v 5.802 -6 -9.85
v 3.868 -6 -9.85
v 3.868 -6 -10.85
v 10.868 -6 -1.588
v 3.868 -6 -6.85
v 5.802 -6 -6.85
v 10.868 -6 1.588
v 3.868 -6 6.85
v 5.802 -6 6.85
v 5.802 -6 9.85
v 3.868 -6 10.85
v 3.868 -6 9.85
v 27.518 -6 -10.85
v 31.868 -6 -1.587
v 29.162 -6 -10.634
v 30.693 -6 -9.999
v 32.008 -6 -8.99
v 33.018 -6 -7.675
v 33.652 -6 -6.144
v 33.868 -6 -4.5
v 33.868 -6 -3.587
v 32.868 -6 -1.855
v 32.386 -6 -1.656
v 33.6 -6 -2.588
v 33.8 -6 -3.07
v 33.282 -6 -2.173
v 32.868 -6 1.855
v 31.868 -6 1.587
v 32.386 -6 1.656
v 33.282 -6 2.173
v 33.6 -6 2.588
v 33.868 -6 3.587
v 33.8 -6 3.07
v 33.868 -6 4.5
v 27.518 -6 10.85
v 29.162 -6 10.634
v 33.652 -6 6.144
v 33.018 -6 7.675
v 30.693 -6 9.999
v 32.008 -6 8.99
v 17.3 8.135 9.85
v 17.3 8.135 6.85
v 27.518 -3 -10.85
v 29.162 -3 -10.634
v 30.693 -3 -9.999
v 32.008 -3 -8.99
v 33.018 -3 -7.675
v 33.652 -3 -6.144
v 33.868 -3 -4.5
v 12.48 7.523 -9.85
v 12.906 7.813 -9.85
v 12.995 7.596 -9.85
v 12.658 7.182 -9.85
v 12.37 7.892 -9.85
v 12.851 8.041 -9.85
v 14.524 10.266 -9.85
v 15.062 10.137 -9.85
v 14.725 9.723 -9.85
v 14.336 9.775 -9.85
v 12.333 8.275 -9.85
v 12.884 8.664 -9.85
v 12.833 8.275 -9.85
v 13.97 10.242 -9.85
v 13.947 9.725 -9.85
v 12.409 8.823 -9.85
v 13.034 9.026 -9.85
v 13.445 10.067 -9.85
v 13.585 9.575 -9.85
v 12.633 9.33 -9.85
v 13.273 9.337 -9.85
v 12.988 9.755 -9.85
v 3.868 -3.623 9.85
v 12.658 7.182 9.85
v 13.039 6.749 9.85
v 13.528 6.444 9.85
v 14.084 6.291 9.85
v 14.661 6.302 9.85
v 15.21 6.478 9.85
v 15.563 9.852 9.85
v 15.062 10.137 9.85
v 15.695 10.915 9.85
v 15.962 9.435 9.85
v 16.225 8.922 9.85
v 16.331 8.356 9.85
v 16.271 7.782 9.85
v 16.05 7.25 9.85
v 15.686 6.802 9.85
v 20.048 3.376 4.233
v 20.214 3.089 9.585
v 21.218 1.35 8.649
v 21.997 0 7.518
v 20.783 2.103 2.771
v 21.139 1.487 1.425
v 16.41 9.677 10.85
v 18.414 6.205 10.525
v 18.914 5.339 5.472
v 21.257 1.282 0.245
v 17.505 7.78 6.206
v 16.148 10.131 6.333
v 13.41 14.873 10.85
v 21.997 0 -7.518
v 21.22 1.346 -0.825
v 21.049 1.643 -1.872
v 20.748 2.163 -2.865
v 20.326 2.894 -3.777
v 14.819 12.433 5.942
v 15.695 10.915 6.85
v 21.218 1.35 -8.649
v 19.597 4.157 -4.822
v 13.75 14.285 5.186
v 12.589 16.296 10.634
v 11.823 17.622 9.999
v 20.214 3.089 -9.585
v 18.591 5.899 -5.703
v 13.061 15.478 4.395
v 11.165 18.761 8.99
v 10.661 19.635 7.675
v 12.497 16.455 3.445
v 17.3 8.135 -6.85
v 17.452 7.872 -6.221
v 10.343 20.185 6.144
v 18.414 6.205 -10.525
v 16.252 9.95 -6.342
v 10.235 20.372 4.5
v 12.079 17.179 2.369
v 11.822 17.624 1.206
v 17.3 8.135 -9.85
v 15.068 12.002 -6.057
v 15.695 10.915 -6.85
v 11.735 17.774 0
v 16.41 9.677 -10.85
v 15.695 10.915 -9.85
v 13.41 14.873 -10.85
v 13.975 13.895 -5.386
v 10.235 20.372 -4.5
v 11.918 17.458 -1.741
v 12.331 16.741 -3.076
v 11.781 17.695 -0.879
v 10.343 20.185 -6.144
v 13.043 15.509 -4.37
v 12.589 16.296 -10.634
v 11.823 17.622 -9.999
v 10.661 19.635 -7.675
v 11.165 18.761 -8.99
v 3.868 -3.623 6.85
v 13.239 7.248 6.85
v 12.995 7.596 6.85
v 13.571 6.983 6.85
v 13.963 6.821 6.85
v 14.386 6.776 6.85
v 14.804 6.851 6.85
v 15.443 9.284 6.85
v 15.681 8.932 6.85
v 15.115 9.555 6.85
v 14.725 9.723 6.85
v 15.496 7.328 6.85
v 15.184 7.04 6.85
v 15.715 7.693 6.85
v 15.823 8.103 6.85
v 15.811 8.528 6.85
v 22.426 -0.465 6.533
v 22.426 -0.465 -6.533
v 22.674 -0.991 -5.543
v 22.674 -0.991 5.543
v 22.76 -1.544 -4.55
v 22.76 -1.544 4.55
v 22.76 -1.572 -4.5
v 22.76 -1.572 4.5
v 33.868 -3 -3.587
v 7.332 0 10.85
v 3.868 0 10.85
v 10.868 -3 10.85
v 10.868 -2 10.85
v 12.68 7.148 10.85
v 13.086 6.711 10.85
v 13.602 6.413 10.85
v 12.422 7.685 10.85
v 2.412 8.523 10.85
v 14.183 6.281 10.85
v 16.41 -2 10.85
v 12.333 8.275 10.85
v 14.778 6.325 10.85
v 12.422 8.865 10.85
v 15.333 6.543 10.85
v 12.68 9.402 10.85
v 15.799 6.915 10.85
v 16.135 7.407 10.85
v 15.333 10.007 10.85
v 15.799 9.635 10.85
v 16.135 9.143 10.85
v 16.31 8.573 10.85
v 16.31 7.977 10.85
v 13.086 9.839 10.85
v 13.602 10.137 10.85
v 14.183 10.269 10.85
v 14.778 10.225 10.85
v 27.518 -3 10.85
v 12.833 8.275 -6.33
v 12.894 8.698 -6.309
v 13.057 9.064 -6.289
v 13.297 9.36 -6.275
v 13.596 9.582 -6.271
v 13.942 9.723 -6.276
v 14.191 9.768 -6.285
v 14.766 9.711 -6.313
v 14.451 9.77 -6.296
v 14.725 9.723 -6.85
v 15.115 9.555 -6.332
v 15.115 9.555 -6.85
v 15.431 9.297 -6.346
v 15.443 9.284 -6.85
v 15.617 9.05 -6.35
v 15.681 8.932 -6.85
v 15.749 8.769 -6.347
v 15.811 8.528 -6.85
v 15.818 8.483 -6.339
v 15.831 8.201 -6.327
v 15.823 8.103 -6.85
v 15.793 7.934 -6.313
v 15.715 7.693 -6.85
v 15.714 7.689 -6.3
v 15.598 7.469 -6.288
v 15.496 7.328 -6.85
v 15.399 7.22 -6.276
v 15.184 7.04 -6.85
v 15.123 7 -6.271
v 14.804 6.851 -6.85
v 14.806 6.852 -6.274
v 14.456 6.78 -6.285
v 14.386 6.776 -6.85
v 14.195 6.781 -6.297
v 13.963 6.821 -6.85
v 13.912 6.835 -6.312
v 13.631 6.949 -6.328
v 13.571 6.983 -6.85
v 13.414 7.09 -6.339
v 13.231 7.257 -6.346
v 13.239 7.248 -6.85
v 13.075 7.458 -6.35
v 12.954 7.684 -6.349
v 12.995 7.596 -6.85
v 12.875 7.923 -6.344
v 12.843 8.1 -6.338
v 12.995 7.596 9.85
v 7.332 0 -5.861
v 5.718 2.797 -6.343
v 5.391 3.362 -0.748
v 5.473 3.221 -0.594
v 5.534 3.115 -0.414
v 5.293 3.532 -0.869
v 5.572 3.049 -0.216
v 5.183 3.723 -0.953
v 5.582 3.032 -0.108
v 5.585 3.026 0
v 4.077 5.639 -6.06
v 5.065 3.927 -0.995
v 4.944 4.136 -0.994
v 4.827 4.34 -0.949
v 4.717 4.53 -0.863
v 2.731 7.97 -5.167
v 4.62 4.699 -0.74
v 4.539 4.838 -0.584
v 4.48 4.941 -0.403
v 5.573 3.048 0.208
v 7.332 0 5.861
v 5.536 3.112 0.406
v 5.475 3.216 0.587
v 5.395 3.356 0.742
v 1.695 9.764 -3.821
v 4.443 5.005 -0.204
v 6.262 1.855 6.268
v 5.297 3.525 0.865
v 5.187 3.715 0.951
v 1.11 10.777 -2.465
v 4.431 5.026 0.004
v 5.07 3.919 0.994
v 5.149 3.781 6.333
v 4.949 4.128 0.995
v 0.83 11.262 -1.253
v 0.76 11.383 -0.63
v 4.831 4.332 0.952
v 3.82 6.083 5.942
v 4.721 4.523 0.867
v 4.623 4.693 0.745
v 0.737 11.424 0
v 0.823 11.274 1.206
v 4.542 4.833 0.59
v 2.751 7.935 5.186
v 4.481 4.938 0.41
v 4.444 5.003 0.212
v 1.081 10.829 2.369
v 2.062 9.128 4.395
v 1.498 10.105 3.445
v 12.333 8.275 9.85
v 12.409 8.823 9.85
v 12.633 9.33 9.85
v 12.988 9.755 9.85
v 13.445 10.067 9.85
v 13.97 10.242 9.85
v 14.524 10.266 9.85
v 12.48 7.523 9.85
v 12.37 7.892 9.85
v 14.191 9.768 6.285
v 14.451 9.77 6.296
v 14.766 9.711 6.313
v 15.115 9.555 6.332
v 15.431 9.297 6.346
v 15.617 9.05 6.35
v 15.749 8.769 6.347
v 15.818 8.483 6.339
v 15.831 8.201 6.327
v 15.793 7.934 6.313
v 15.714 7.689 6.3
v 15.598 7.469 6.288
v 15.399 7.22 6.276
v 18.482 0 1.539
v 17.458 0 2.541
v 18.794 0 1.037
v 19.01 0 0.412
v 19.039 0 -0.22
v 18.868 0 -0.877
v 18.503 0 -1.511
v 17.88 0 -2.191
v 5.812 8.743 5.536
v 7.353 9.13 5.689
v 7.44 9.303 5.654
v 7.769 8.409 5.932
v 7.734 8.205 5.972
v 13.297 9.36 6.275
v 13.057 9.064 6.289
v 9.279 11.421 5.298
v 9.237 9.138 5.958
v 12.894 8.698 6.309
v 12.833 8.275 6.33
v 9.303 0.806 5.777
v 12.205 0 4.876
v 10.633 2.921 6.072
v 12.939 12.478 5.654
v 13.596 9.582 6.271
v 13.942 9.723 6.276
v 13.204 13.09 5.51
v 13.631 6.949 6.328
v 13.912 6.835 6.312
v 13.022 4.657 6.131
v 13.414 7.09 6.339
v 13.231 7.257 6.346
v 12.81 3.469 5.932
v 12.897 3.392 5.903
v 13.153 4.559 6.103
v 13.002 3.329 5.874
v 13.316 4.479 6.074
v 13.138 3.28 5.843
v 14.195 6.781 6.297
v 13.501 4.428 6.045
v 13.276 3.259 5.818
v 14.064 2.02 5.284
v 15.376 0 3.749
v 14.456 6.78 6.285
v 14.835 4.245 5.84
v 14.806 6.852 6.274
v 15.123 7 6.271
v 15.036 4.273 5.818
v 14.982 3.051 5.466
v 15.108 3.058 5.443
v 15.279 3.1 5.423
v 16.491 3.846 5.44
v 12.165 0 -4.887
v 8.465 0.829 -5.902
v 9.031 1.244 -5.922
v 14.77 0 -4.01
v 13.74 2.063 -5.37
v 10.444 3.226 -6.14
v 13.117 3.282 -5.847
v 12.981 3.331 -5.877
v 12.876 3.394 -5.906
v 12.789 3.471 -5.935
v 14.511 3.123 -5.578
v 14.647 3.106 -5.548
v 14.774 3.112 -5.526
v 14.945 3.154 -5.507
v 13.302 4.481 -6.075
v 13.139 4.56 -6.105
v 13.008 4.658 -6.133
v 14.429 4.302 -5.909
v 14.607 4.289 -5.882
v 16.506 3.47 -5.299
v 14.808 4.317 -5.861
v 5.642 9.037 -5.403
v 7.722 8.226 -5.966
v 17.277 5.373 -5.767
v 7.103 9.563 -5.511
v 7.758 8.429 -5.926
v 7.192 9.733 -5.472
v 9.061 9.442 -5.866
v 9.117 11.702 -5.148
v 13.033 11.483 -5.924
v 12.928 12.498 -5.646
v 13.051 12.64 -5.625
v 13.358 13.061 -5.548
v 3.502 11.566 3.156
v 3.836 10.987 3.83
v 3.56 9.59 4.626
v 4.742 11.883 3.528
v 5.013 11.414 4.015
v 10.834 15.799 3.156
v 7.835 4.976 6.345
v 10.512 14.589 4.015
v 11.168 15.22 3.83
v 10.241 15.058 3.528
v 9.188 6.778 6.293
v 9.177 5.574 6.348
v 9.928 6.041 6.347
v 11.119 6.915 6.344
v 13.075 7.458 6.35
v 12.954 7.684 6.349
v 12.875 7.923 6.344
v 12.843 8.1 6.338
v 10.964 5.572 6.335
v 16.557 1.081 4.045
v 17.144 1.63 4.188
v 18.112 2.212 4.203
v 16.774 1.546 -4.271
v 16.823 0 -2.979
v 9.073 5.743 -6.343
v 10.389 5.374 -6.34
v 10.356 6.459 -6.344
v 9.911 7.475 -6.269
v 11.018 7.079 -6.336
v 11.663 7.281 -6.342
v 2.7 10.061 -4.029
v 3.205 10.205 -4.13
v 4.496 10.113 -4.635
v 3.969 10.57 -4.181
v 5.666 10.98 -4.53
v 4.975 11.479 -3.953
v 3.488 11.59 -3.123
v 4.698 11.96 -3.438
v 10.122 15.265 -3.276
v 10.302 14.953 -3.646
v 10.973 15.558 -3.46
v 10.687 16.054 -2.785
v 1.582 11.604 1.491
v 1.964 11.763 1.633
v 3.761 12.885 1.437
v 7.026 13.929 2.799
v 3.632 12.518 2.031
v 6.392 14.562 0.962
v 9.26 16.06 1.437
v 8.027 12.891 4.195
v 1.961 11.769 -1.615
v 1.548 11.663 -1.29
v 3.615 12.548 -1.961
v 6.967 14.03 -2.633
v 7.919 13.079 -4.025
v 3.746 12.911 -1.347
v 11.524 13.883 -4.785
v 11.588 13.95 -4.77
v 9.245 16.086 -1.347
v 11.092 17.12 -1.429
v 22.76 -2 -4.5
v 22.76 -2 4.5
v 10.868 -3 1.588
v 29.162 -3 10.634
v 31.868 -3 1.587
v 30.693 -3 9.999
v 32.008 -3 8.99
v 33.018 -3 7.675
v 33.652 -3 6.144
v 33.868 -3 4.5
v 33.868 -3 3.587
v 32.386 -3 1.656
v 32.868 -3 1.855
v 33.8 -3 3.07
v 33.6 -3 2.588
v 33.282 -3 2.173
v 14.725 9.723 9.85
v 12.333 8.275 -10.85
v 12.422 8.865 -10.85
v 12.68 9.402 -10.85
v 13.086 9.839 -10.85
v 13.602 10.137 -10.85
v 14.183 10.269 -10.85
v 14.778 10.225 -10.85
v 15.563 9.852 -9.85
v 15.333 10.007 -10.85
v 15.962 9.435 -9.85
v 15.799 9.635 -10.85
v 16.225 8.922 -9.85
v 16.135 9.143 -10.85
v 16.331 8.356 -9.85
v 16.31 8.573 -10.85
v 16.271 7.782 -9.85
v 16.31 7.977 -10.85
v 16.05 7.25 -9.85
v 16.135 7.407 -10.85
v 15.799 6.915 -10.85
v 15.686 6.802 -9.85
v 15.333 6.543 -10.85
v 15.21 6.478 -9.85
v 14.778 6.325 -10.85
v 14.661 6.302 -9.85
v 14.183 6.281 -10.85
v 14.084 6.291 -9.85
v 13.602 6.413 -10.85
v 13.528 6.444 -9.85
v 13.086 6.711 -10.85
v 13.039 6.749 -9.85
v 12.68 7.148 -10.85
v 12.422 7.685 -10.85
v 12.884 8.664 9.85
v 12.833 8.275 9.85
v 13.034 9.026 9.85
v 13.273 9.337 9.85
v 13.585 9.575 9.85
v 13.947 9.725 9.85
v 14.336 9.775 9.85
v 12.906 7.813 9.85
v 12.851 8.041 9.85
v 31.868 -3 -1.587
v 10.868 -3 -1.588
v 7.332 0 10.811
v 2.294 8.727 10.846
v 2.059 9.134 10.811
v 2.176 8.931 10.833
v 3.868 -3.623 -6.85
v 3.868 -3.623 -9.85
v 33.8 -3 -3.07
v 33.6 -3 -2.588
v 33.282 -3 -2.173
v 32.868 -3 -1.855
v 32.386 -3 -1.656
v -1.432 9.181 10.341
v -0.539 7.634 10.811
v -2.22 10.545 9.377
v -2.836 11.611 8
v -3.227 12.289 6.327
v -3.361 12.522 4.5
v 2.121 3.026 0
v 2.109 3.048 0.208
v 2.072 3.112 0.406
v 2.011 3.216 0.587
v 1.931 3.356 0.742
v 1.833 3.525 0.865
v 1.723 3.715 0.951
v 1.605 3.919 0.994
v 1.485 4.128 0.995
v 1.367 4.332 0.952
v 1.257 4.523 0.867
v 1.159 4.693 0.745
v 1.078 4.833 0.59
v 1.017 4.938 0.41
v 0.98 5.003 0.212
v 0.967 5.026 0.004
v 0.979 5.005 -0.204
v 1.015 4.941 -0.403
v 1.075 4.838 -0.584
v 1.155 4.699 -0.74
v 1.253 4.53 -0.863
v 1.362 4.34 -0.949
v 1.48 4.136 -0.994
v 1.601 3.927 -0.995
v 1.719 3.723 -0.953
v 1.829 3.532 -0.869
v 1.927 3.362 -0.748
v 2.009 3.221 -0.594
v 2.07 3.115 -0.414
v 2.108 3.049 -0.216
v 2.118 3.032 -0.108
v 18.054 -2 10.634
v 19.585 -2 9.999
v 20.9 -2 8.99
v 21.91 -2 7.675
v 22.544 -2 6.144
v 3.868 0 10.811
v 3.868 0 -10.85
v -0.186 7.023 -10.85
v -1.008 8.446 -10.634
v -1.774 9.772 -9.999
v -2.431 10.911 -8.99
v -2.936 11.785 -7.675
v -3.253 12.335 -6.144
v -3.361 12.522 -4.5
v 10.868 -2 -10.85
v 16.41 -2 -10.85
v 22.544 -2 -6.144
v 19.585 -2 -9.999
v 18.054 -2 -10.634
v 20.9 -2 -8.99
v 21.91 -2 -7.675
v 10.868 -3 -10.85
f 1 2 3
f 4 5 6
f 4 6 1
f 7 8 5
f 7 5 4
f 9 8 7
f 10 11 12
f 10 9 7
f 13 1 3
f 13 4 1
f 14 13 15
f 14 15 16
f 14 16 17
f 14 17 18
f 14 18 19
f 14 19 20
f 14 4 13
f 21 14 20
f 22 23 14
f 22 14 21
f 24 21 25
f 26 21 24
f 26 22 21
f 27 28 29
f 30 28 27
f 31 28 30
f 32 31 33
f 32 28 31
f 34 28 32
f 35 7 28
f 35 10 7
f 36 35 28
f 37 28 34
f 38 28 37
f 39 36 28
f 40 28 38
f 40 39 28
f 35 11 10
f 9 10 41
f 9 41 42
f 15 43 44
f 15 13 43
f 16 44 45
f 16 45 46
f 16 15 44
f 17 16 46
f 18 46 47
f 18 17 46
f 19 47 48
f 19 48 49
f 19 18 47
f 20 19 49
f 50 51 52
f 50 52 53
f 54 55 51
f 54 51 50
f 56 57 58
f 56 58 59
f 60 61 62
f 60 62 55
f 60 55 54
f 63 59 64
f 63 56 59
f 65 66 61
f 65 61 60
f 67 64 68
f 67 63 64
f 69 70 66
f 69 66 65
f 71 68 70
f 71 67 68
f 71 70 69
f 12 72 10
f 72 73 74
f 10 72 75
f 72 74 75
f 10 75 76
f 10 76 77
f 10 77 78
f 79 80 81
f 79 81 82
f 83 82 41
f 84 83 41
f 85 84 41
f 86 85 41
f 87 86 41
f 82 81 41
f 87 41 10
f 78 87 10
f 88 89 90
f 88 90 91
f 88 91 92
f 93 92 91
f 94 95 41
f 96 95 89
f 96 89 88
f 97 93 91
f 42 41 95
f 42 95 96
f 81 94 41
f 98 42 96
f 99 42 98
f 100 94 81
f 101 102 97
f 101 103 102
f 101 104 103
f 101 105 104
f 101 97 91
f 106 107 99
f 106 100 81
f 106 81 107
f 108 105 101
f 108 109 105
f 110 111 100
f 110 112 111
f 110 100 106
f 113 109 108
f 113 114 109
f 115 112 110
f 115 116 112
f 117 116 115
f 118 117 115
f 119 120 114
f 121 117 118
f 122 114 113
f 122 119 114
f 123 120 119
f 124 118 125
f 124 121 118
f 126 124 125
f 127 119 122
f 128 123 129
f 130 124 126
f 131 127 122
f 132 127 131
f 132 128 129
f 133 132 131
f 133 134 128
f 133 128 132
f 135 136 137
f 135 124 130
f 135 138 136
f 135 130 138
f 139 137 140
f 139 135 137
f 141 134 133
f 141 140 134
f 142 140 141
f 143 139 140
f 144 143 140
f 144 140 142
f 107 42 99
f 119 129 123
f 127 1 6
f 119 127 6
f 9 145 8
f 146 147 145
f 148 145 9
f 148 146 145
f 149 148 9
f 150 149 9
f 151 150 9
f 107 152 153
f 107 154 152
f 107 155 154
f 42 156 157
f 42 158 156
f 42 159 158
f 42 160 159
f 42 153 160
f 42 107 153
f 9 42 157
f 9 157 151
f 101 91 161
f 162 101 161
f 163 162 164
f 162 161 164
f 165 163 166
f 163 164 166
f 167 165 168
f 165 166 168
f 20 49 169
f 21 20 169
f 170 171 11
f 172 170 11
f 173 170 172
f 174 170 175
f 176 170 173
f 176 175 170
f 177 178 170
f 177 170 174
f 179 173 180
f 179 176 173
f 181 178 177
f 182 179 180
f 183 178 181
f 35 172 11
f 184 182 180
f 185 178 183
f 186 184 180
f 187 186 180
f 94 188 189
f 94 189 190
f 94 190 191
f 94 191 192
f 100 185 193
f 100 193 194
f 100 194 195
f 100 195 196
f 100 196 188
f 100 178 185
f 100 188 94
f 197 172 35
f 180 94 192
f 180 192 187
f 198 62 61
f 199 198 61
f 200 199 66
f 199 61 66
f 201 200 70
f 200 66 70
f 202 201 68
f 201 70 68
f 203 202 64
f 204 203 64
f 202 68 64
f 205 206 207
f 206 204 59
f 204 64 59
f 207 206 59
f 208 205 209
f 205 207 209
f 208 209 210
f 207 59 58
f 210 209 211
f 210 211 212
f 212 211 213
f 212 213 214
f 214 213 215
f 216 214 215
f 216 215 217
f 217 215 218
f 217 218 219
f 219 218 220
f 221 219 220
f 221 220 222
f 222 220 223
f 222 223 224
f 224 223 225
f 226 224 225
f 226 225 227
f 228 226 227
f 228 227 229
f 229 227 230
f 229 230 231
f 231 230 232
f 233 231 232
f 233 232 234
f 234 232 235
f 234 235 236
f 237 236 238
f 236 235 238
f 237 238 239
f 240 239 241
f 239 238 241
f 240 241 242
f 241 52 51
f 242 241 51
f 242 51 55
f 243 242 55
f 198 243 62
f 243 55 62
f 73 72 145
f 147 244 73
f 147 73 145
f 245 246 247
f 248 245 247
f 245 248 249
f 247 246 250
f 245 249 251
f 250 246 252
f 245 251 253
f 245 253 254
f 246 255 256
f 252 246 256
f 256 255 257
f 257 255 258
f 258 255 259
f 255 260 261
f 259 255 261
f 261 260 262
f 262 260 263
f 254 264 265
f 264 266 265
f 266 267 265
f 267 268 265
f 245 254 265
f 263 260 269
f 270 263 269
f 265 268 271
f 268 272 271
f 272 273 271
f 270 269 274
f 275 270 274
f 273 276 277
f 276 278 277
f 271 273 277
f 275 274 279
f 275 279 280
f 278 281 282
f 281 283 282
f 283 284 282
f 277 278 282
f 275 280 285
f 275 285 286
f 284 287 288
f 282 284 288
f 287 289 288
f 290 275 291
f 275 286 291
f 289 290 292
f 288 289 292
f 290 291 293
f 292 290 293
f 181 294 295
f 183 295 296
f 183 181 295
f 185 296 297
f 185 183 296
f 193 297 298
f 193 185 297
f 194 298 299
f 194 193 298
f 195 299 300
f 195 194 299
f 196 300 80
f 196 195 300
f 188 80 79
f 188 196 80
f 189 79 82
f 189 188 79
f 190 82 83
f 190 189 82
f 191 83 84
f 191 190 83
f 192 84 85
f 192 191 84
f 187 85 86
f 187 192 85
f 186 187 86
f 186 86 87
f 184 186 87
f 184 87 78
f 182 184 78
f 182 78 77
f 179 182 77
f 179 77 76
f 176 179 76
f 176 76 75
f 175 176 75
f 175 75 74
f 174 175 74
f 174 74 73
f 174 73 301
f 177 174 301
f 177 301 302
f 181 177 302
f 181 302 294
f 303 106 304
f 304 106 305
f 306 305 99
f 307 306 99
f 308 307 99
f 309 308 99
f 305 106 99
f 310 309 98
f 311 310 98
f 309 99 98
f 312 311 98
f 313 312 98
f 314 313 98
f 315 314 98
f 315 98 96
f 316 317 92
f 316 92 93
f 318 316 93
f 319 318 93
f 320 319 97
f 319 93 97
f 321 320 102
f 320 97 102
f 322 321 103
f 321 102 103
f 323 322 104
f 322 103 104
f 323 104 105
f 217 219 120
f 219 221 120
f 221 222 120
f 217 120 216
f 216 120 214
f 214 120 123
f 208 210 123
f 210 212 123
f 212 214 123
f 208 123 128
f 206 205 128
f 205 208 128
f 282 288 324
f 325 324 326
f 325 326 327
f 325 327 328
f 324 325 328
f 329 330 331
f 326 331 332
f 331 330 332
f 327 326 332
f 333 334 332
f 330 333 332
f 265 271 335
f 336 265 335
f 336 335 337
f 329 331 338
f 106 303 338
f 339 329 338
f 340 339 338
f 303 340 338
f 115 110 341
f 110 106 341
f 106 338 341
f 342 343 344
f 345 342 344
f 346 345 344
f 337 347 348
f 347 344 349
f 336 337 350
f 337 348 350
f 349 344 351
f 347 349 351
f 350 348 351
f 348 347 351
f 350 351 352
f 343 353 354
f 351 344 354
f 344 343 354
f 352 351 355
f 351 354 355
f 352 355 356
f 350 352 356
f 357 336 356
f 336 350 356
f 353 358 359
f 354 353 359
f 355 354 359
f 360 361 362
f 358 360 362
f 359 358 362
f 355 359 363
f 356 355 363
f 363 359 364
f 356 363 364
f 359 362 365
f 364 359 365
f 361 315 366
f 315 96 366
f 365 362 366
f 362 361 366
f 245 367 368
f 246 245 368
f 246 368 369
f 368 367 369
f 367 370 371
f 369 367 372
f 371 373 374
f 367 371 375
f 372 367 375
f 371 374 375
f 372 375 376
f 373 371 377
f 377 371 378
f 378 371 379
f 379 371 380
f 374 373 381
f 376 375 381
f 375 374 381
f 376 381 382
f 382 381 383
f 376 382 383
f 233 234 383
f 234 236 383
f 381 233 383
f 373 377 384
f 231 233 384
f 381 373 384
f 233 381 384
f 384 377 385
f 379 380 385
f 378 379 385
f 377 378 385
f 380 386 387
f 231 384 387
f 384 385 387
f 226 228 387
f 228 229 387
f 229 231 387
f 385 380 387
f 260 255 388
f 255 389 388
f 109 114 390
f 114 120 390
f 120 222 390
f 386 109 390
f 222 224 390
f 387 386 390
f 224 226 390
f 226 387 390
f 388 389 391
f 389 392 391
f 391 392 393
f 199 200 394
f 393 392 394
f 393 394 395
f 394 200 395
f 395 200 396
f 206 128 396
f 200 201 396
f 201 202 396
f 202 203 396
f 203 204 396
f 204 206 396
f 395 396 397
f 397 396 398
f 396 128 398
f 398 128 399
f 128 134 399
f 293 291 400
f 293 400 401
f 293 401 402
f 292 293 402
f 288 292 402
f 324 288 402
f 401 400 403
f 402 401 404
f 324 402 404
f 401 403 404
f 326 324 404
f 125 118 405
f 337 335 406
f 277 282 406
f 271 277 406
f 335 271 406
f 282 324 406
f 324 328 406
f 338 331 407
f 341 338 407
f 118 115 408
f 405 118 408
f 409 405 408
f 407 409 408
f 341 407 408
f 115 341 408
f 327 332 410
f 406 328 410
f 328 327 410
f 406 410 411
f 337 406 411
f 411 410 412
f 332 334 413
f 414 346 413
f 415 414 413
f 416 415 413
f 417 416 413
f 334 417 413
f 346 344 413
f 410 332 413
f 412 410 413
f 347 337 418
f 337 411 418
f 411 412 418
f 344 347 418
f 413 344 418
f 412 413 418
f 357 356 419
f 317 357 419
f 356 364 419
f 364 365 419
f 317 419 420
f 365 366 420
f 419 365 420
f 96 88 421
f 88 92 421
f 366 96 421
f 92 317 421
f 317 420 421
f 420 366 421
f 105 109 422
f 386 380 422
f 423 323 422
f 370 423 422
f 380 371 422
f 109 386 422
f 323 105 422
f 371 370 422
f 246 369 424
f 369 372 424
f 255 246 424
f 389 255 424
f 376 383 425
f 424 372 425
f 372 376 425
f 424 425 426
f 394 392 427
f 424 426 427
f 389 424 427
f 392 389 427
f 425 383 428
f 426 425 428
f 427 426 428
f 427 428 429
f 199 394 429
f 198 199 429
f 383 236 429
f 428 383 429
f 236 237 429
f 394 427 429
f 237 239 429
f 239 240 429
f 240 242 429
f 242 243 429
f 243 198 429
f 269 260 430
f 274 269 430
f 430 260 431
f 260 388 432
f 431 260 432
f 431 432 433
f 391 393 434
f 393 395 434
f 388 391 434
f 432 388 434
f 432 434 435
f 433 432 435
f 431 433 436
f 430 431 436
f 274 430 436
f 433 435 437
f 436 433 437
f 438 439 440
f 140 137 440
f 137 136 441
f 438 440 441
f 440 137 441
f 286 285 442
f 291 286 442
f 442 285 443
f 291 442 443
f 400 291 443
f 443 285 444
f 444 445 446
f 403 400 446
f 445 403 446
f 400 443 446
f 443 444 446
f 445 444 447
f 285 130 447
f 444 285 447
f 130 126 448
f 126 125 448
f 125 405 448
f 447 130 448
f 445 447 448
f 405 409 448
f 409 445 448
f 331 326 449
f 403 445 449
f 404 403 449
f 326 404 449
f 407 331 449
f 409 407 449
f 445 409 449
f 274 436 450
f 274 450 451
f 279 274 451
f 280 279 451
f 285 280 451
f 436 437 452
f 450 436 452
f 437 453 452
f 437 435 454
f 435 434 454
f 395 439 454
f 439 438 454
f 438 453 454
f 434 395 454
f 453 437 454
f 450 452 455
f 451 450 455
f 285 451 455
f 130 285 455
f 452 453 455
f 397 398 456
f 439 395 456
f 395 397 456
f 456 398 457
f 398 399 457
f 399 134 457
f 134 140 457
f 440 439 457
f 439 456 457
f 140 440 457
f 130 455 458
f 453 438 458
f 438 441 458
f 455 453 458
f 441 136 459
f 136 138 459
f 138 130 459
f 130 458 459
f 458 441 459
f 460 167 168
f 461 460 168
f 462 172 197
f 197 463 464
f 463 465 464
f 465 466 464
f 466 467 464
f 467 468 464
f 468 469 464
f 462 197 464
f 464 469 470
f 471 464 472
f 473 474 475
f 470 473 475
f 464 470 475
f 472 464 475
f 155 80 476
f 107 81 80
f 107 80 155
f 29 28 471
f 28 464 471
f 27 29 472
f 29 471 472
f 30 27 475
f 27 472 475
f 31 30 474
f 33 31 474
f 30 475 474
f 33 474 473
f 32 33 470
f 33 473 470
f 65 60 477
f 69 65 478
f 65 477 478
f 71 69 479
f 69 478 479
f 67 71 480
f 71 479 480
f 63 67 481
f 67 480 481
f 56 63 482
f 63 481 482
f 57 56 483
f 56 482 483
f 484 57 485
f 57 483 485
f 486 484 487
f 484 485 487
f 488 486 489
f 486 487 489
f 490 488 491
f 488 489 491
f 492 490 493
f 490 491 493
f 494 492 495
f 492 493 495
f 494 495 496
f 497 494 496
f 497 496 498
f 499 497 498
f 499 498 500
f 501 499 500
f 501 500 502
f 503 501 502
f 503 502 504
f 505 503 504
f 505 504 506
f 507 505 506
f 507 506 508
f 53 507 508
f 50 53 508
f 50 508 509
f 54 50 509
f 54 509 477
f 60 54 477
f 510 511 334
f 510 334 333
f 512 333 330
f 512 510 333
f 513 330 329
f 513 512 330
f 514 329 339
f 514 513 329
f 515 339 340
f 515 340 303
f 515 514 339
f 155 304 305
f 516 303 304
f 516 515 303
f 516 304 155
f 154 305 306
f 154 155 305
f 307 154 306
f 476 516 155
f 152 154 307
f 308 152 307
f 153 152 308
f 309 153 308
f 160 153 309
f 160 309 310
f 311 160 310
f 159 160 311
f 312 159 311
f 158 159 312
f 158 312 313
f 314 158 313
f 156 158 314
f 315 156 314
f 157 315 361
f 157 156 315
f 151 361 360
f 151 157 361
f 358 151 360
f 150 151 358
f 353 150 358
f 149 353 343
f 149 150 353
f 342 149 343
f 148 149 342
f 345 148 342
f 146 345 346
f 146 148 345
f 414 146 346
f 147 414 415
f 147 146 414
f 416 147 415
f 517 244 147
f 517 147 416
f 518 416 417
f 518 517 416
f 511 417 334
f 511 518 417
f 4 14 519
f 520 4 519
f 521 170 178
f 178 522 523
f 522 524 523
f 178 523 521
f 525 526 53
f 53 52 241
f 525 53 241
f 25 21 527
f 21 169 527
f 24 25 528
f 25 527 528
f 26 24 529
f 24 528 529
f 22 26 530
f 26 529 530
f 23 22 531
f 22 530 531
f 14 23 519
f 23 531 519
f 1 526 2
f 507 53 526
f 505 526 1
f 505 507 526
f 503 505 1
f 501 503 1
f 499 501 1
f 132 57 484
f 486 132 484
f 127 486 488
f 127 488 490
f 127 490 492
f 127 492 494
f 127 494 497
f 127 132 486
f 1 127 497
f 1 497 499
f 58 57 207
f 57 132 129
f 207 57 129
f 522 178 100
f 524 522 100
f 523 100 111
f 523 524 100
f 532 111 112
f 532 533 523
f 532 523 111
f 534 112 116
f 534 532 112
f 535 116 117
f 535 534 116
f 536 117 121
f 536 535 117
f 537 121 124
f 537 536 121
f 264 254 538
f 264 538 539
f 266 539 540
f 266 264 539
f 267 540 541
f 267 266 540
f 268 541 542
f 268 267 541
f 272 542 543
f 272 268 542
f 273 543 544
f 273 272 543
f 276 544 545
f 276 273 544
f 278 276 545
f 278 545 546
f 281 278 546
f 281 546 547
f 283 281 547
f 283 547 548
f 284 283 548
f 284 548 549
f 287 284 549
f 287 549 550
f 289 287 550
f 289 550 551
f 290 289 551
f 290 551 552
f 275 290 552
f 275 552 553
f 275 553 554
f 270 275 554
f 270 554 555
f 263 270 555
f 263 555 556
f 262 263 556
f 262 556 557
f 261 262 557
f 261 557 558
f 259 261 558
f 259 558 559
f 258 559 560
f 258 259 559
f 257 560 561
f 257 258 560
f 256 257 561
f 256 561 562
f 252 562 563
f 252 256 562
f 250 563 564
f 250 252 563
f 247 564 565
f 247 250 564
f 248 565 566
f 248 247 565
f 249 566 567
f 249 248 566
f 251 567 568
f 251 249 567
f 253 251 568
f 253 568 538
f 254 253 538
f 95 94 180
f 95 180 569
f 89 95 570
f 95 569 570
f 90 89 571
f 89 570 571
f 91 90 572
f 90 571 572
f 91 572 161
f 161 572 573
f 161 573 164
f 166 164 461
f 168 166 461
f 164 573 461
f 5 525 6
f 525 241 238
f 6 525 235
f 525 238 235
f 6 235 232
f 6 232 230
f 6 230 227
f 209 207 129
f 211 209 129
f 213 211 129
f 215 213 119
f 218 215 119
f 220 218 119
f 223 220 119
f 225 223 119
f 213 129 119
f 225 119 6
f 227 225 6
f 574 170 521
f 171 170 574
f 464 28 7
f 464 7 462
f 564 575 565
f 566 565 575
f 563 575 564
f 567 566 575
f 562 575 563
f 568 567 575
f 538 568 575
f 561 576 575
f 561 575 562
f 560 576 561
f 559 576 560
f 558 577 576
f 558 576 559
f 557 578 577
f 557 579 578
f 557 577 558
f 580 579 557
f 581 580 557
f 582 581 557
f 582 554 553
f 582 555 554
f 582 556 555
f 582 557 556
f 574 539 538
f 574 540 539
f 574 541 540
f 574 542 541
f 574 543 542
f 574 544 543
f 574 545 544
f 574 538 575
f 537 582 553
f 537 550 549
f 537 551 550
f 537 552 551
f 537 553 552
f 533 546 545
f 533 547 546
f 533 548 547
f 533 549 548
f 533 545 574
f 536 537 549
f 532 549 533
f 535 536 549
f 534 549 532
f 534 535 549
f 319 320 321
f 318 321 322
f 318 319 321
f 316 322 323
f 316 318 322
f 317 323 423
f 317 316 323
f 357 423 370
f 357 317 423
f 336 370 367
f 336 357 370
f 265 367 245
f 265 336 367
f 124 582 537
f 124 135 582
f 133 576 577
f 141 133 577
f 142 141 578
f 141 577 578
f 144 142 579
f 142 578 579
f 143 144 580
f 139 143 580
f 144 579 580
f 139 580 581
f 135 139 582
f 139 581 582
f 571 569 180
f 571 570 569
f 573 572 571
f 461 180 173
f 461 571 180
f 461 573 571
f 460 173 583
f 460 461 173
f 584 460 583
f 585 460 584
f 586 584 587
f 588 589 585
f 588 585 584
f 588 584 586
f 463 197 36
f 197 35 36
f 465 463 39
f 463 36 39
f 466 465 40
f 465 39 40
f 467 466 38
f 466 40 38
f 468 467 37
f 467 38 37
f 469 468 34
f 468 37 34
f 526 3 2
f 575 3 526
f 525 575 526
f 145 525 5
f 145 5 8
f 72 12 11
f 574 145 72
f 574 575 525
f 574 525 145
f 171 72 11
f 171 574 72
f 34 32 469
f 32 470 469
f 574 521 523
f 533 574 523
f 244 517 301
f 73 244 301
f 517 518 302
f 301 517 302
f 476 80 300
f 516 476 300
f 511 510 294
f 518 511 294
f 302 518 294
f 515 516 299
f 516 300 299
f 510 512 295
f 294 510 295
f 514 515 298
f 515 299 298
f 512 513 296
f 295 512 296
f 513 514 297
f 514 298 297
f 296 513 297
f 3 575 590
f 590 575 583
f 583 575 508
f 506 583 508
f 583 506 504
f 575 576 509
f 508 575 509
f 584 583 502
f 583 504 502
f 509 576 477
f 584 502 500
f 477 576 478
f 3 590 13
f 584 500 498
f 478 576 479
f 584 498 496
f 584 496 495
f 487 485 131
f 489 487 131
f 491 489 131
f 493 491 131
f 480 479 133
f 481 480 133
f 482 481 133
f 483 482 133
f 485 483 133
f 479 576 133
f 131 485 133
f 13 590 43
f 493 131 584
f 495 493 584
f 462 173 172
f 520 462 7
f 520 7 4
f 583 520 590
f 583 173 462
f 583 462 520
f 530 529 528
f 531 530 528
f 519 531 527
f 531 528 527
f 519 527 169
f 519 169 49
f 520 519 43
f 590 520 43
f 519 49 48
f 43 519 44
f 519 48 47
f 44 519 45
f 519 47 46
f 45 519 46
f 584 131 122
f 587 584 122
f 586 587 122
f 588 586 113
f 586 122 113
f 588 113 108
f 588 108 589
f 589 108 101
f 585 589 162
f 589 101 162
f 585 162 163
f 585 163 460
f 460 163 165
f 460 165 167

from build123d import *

# Parameters (mm, degrees)
SKETCH2_W           = 21.7
SKETCH2_H           = 25.05
SKETCH2_RX          = 9.525
SKETCH2_RY          = 6.35
BOSS_EXTRUDE1_DEPTH = 12.7
SKETCH3_W           = 21.660653916
SKETCH3_H           = 25.05
BOSS_EXTRUDE2_DEPTH = 3
SKETCH5_W           = 18.892037138
SKETCH5_H           = 21.7
BOSS_EXTRUDE3_DEPTH = 2
SKETCH6_W           = 30
SKETCH6_H           = 21.7
BOSS_EXTRUDE4_DEPTH = 4
SKETCH7_W           = 21.7
SKETCH7_H           = 1
SKETCH7_W_2         = 3.175
SKETCH7_H_2         = 3
CUT_EXTRUDE2_DEPTH  = 23
SKETCH7_3_W         = 21.7
SKETCH7_3_H         = 7.272473706
CUT_EXTRUDE3_DEPTH  = 44.803879418
SKETCH11_R          = 1
CUT_EXTRUDE8_DEPTH  = 33.487034031
SKETCH15_W          = 3
SKETCH15_H          = 3
CUT_EXTRUDE9_DEPTH  = 28.443249292
CUT_EXTRUDE4_REACH  = 47.088
SKETCH9_R           = 1.5
SKETCH10_R          = 2
CUT_EXTRUDE7_DEPTH  = 1
FILLET5_R           = 6.35
FILLET6_R           = 2
FILLET7_R           = 2


with BuildPart() as part:
    # Sketch2 → Boss-Extrude1 (new body)
    with BuildSketch(Plane(origin=(16.497783942, 9.525, 0), x_dir=(0, 0, -1), z_dir=(0.8660254037844379, 0.5000000000000013, 0))):
        Rectangle(SKETCH2_W, SKETCH2_H)
        with Locations(Location((0, 0), (0, 0, 90))):
            Ellipse(SKETCH2_RX, SKETCH2_RY, mode=Mode.SUBTRACT)
    extrude(amount=-BOSS_EXTRUDE1_DEPTH)

    # Sketch3 → Boss-Extrude2 (add)
    with BuildSketch(Plane(origin=(5.499261314, 3.175, 0), x_dir=(0, 0, 1), z_dir=(-0.8660254037844379, -0.5000000000000014, 0))):
        with Locations((-0.019673042, 0)):
            Rectangle(SKETCH3_W, SKETCH3_H)
    extrude(amount=BOSS_EXTRUDE2_DEPTH)

    # Sketch5 → Boss-Extrude3 (add)
    with BuildSketch(Plane(origin=(0, 0, 0), x_dir=(-1, 0, 0), z_dir=(0, 1, 0))):
        with Locations((-13.314265373, 0)):
            Rectangle(SKETCH5_W, SKETCH5_H)
    extrude(amount=-BOSS_EXTRUDE3_DEPTH)

    # Sketch6 → Boss-Extrude4 (add)
    with BuildSketch(Plane.XZ.offset(2)):
        with Locations((18.868246804, 0)):
            Rectangle(SKETCH6_W, SKETCH6_H)
    extrude(amount=BOSS_EXTRUDE4_DEPTH)

    # Sketch7 → Cut-Extrude2 (cut)
    with BuildSketch(Plane(origin=(33.868246804, 0, 0), x_dir=(0, 0, -1), z_dir=(1, 0, 0))):
        with Locations((0, -2.5)):
            Rectangle(SKETCH7_W, SKETCH7_H)
        with Locations((0, -4.5)):
            Rectangle(SKETCH7_W_2, SKETCH7_H_2)
    extrude(amount=-CUT_EXTRUDE2_DEPTH, mode=Mode.SUBTRACT)

    # Sketch7<3> → Cut-Extrude3 (cut, through all)
    with BuildSketch(Plane(origin=(33.868246804, 0, 0), x_dir=(0, 0, -1), z_dir=(1, 0, 0))):
        with Locations((0, -9.636236853)):
            Rectangle(SKETCH7_3_W, SKETCH7_3_H)
    extrude(amount=-CUT_EXTRUDE3_DEPTH, mode=Mode.SUBTRACT)

    # Sketch11 → Cut-Extrude8 (cut, through all)
    with BuildSketch(Plane(origin=(19.672783942, 0.194872981, 0), x_dir=(0, 0, -1), z_dir=(-1, 0, 0))):
        with Locations(Location((0, -3.830865705, 0), (0, 0, 90))):
            Circle(SKETCH11_R)
    extrude(amount=CUT_EXTRUDE8_DEPTH, mode=Mode.SUBTRACT)

    # Sketch15 → Cut-Extrude9 (cut, symmetric)
    with BuildSketch(Plane(origin=(16.497783942, 9.525, 0), x_dir=(0.7757354378747654, -0.6310582623064579, 0), z_dir=(0.6310582623064579, 0.7757354378747654, 0))):
        with Locations((0, -8.35)):
            Rectangle(SKETCH15_W, SKETCH15_H)
    cut_extrude9 = extrude(amount=CUT_EXTRUDE9_DEPTH, both=True, mode=Mode.SUBTRACT)

    # Sketch9 → Cut-Extrude4 (cut, up to next)
    with BuildSketch(Plane(origin=(0, 0, -10.85), x_dir=(-1, 0, 0), z_dir=(0, 0, -1)), mode=Mode.PRIVATE) as cut_extrude4_sk1:
        with Locations((-14.332720433, 8.275)):
            Circle(SKETCH9_R)
    cut_extrude4_tool1 = extrude(cut_extrude4_sk1.sketch, amount=-CUT_EXTRUDE4_REACH, mode=Mode.PRIVATE) & part.part
    cut_extrude4 = cut_extrude4_tool1.solids().sort_by_distance((14.33272, 8.275, -10.85))[0]
    add(cut_extrude4, mode=Mode.SUBTRACT)

    # Sketch10 → Cut-Extrude7 (cut)
    with BuildSketch(Plane(origin=(0, 0, -10.85), x_dir=(-1, 0, 0), z_dir=(0, 0, -1))):
        with Locations((-14.332720433, 8.275)):
            Circle(SKETCH10_R)
    cut_extrude7 = extrude(amount=-CUT_EXTRUDE7_DEPTH, mode=Mode.SUBTRACT)

    # Mirror1: Cut-Extrude9, Cut-Extrude4, Cut-Extrude7 across plane
    add(cut_extrude9.mirror(Plane.XY), mode=Mode.SUBTRACT)
    add(cut_extrude4.mirror(Plane.XY), mode=Mode.SUBTRACT)
    add(cut_extrude7.mirror(Plane.XY), mode=Mode.SUBTRACT)

    # Fillet5
    fillet5_edges = [part.edges().sort_by_distance(p)[0] for p in [
        (33.868246804, -4.5, 10.85),
        (33.868246804, -4.5, -10.85),
        (22.760283942, -1, -10.85),
        (22.760283942, -1, 10.85),
        (4.736022628, 17.196968182, 10.85),
        (3.436984522, 16.446968182, -10.85),
    ]]
    fillet(fillet5_edges, radius=FILLET5_R)

    # Fillet6
    fillet6_edges = [part.edges().sort_by_distance(p)[0] for p in [
        (33.868246804, -4.5, 1.5875),
        (33.868246804, -4.5, -1.5875),
    ]]
    fillet(fillet6_edges, radius=FILLET6_R)

    # Fillet7
    # the kernel refuses this fillet: 2 mm, written as the material it takes off along each edge
    with BuildSketch(Plane(origin=(22.760283942, 0, 8.429393602), x_dir=(-1, 0, 0), z_dir=(0, 0, -1))) as fillet7_piece_1:
        with BuildLine():
            CenterArc((2, -1.571757441), FILLET7_R, 128.197977663, 51.802022337)
            Line((0, -1.571757441), (-0.04, -1.571757441))
            Line((-0.04, -1.571757441), (-0.04, 0))
            Line((-0.04, 0), (0, 0.04))
            ThreePointArc((0, 0.04), (0.381619343, 0.04), (0.73850346, 0.031435149))
            Line((0.73850346, 0.031435149), (0.763238686, 0))
        make_face()
    extrude(amount=16.858787203, mode=Mode.SUBTRACT)


solid = part.part
